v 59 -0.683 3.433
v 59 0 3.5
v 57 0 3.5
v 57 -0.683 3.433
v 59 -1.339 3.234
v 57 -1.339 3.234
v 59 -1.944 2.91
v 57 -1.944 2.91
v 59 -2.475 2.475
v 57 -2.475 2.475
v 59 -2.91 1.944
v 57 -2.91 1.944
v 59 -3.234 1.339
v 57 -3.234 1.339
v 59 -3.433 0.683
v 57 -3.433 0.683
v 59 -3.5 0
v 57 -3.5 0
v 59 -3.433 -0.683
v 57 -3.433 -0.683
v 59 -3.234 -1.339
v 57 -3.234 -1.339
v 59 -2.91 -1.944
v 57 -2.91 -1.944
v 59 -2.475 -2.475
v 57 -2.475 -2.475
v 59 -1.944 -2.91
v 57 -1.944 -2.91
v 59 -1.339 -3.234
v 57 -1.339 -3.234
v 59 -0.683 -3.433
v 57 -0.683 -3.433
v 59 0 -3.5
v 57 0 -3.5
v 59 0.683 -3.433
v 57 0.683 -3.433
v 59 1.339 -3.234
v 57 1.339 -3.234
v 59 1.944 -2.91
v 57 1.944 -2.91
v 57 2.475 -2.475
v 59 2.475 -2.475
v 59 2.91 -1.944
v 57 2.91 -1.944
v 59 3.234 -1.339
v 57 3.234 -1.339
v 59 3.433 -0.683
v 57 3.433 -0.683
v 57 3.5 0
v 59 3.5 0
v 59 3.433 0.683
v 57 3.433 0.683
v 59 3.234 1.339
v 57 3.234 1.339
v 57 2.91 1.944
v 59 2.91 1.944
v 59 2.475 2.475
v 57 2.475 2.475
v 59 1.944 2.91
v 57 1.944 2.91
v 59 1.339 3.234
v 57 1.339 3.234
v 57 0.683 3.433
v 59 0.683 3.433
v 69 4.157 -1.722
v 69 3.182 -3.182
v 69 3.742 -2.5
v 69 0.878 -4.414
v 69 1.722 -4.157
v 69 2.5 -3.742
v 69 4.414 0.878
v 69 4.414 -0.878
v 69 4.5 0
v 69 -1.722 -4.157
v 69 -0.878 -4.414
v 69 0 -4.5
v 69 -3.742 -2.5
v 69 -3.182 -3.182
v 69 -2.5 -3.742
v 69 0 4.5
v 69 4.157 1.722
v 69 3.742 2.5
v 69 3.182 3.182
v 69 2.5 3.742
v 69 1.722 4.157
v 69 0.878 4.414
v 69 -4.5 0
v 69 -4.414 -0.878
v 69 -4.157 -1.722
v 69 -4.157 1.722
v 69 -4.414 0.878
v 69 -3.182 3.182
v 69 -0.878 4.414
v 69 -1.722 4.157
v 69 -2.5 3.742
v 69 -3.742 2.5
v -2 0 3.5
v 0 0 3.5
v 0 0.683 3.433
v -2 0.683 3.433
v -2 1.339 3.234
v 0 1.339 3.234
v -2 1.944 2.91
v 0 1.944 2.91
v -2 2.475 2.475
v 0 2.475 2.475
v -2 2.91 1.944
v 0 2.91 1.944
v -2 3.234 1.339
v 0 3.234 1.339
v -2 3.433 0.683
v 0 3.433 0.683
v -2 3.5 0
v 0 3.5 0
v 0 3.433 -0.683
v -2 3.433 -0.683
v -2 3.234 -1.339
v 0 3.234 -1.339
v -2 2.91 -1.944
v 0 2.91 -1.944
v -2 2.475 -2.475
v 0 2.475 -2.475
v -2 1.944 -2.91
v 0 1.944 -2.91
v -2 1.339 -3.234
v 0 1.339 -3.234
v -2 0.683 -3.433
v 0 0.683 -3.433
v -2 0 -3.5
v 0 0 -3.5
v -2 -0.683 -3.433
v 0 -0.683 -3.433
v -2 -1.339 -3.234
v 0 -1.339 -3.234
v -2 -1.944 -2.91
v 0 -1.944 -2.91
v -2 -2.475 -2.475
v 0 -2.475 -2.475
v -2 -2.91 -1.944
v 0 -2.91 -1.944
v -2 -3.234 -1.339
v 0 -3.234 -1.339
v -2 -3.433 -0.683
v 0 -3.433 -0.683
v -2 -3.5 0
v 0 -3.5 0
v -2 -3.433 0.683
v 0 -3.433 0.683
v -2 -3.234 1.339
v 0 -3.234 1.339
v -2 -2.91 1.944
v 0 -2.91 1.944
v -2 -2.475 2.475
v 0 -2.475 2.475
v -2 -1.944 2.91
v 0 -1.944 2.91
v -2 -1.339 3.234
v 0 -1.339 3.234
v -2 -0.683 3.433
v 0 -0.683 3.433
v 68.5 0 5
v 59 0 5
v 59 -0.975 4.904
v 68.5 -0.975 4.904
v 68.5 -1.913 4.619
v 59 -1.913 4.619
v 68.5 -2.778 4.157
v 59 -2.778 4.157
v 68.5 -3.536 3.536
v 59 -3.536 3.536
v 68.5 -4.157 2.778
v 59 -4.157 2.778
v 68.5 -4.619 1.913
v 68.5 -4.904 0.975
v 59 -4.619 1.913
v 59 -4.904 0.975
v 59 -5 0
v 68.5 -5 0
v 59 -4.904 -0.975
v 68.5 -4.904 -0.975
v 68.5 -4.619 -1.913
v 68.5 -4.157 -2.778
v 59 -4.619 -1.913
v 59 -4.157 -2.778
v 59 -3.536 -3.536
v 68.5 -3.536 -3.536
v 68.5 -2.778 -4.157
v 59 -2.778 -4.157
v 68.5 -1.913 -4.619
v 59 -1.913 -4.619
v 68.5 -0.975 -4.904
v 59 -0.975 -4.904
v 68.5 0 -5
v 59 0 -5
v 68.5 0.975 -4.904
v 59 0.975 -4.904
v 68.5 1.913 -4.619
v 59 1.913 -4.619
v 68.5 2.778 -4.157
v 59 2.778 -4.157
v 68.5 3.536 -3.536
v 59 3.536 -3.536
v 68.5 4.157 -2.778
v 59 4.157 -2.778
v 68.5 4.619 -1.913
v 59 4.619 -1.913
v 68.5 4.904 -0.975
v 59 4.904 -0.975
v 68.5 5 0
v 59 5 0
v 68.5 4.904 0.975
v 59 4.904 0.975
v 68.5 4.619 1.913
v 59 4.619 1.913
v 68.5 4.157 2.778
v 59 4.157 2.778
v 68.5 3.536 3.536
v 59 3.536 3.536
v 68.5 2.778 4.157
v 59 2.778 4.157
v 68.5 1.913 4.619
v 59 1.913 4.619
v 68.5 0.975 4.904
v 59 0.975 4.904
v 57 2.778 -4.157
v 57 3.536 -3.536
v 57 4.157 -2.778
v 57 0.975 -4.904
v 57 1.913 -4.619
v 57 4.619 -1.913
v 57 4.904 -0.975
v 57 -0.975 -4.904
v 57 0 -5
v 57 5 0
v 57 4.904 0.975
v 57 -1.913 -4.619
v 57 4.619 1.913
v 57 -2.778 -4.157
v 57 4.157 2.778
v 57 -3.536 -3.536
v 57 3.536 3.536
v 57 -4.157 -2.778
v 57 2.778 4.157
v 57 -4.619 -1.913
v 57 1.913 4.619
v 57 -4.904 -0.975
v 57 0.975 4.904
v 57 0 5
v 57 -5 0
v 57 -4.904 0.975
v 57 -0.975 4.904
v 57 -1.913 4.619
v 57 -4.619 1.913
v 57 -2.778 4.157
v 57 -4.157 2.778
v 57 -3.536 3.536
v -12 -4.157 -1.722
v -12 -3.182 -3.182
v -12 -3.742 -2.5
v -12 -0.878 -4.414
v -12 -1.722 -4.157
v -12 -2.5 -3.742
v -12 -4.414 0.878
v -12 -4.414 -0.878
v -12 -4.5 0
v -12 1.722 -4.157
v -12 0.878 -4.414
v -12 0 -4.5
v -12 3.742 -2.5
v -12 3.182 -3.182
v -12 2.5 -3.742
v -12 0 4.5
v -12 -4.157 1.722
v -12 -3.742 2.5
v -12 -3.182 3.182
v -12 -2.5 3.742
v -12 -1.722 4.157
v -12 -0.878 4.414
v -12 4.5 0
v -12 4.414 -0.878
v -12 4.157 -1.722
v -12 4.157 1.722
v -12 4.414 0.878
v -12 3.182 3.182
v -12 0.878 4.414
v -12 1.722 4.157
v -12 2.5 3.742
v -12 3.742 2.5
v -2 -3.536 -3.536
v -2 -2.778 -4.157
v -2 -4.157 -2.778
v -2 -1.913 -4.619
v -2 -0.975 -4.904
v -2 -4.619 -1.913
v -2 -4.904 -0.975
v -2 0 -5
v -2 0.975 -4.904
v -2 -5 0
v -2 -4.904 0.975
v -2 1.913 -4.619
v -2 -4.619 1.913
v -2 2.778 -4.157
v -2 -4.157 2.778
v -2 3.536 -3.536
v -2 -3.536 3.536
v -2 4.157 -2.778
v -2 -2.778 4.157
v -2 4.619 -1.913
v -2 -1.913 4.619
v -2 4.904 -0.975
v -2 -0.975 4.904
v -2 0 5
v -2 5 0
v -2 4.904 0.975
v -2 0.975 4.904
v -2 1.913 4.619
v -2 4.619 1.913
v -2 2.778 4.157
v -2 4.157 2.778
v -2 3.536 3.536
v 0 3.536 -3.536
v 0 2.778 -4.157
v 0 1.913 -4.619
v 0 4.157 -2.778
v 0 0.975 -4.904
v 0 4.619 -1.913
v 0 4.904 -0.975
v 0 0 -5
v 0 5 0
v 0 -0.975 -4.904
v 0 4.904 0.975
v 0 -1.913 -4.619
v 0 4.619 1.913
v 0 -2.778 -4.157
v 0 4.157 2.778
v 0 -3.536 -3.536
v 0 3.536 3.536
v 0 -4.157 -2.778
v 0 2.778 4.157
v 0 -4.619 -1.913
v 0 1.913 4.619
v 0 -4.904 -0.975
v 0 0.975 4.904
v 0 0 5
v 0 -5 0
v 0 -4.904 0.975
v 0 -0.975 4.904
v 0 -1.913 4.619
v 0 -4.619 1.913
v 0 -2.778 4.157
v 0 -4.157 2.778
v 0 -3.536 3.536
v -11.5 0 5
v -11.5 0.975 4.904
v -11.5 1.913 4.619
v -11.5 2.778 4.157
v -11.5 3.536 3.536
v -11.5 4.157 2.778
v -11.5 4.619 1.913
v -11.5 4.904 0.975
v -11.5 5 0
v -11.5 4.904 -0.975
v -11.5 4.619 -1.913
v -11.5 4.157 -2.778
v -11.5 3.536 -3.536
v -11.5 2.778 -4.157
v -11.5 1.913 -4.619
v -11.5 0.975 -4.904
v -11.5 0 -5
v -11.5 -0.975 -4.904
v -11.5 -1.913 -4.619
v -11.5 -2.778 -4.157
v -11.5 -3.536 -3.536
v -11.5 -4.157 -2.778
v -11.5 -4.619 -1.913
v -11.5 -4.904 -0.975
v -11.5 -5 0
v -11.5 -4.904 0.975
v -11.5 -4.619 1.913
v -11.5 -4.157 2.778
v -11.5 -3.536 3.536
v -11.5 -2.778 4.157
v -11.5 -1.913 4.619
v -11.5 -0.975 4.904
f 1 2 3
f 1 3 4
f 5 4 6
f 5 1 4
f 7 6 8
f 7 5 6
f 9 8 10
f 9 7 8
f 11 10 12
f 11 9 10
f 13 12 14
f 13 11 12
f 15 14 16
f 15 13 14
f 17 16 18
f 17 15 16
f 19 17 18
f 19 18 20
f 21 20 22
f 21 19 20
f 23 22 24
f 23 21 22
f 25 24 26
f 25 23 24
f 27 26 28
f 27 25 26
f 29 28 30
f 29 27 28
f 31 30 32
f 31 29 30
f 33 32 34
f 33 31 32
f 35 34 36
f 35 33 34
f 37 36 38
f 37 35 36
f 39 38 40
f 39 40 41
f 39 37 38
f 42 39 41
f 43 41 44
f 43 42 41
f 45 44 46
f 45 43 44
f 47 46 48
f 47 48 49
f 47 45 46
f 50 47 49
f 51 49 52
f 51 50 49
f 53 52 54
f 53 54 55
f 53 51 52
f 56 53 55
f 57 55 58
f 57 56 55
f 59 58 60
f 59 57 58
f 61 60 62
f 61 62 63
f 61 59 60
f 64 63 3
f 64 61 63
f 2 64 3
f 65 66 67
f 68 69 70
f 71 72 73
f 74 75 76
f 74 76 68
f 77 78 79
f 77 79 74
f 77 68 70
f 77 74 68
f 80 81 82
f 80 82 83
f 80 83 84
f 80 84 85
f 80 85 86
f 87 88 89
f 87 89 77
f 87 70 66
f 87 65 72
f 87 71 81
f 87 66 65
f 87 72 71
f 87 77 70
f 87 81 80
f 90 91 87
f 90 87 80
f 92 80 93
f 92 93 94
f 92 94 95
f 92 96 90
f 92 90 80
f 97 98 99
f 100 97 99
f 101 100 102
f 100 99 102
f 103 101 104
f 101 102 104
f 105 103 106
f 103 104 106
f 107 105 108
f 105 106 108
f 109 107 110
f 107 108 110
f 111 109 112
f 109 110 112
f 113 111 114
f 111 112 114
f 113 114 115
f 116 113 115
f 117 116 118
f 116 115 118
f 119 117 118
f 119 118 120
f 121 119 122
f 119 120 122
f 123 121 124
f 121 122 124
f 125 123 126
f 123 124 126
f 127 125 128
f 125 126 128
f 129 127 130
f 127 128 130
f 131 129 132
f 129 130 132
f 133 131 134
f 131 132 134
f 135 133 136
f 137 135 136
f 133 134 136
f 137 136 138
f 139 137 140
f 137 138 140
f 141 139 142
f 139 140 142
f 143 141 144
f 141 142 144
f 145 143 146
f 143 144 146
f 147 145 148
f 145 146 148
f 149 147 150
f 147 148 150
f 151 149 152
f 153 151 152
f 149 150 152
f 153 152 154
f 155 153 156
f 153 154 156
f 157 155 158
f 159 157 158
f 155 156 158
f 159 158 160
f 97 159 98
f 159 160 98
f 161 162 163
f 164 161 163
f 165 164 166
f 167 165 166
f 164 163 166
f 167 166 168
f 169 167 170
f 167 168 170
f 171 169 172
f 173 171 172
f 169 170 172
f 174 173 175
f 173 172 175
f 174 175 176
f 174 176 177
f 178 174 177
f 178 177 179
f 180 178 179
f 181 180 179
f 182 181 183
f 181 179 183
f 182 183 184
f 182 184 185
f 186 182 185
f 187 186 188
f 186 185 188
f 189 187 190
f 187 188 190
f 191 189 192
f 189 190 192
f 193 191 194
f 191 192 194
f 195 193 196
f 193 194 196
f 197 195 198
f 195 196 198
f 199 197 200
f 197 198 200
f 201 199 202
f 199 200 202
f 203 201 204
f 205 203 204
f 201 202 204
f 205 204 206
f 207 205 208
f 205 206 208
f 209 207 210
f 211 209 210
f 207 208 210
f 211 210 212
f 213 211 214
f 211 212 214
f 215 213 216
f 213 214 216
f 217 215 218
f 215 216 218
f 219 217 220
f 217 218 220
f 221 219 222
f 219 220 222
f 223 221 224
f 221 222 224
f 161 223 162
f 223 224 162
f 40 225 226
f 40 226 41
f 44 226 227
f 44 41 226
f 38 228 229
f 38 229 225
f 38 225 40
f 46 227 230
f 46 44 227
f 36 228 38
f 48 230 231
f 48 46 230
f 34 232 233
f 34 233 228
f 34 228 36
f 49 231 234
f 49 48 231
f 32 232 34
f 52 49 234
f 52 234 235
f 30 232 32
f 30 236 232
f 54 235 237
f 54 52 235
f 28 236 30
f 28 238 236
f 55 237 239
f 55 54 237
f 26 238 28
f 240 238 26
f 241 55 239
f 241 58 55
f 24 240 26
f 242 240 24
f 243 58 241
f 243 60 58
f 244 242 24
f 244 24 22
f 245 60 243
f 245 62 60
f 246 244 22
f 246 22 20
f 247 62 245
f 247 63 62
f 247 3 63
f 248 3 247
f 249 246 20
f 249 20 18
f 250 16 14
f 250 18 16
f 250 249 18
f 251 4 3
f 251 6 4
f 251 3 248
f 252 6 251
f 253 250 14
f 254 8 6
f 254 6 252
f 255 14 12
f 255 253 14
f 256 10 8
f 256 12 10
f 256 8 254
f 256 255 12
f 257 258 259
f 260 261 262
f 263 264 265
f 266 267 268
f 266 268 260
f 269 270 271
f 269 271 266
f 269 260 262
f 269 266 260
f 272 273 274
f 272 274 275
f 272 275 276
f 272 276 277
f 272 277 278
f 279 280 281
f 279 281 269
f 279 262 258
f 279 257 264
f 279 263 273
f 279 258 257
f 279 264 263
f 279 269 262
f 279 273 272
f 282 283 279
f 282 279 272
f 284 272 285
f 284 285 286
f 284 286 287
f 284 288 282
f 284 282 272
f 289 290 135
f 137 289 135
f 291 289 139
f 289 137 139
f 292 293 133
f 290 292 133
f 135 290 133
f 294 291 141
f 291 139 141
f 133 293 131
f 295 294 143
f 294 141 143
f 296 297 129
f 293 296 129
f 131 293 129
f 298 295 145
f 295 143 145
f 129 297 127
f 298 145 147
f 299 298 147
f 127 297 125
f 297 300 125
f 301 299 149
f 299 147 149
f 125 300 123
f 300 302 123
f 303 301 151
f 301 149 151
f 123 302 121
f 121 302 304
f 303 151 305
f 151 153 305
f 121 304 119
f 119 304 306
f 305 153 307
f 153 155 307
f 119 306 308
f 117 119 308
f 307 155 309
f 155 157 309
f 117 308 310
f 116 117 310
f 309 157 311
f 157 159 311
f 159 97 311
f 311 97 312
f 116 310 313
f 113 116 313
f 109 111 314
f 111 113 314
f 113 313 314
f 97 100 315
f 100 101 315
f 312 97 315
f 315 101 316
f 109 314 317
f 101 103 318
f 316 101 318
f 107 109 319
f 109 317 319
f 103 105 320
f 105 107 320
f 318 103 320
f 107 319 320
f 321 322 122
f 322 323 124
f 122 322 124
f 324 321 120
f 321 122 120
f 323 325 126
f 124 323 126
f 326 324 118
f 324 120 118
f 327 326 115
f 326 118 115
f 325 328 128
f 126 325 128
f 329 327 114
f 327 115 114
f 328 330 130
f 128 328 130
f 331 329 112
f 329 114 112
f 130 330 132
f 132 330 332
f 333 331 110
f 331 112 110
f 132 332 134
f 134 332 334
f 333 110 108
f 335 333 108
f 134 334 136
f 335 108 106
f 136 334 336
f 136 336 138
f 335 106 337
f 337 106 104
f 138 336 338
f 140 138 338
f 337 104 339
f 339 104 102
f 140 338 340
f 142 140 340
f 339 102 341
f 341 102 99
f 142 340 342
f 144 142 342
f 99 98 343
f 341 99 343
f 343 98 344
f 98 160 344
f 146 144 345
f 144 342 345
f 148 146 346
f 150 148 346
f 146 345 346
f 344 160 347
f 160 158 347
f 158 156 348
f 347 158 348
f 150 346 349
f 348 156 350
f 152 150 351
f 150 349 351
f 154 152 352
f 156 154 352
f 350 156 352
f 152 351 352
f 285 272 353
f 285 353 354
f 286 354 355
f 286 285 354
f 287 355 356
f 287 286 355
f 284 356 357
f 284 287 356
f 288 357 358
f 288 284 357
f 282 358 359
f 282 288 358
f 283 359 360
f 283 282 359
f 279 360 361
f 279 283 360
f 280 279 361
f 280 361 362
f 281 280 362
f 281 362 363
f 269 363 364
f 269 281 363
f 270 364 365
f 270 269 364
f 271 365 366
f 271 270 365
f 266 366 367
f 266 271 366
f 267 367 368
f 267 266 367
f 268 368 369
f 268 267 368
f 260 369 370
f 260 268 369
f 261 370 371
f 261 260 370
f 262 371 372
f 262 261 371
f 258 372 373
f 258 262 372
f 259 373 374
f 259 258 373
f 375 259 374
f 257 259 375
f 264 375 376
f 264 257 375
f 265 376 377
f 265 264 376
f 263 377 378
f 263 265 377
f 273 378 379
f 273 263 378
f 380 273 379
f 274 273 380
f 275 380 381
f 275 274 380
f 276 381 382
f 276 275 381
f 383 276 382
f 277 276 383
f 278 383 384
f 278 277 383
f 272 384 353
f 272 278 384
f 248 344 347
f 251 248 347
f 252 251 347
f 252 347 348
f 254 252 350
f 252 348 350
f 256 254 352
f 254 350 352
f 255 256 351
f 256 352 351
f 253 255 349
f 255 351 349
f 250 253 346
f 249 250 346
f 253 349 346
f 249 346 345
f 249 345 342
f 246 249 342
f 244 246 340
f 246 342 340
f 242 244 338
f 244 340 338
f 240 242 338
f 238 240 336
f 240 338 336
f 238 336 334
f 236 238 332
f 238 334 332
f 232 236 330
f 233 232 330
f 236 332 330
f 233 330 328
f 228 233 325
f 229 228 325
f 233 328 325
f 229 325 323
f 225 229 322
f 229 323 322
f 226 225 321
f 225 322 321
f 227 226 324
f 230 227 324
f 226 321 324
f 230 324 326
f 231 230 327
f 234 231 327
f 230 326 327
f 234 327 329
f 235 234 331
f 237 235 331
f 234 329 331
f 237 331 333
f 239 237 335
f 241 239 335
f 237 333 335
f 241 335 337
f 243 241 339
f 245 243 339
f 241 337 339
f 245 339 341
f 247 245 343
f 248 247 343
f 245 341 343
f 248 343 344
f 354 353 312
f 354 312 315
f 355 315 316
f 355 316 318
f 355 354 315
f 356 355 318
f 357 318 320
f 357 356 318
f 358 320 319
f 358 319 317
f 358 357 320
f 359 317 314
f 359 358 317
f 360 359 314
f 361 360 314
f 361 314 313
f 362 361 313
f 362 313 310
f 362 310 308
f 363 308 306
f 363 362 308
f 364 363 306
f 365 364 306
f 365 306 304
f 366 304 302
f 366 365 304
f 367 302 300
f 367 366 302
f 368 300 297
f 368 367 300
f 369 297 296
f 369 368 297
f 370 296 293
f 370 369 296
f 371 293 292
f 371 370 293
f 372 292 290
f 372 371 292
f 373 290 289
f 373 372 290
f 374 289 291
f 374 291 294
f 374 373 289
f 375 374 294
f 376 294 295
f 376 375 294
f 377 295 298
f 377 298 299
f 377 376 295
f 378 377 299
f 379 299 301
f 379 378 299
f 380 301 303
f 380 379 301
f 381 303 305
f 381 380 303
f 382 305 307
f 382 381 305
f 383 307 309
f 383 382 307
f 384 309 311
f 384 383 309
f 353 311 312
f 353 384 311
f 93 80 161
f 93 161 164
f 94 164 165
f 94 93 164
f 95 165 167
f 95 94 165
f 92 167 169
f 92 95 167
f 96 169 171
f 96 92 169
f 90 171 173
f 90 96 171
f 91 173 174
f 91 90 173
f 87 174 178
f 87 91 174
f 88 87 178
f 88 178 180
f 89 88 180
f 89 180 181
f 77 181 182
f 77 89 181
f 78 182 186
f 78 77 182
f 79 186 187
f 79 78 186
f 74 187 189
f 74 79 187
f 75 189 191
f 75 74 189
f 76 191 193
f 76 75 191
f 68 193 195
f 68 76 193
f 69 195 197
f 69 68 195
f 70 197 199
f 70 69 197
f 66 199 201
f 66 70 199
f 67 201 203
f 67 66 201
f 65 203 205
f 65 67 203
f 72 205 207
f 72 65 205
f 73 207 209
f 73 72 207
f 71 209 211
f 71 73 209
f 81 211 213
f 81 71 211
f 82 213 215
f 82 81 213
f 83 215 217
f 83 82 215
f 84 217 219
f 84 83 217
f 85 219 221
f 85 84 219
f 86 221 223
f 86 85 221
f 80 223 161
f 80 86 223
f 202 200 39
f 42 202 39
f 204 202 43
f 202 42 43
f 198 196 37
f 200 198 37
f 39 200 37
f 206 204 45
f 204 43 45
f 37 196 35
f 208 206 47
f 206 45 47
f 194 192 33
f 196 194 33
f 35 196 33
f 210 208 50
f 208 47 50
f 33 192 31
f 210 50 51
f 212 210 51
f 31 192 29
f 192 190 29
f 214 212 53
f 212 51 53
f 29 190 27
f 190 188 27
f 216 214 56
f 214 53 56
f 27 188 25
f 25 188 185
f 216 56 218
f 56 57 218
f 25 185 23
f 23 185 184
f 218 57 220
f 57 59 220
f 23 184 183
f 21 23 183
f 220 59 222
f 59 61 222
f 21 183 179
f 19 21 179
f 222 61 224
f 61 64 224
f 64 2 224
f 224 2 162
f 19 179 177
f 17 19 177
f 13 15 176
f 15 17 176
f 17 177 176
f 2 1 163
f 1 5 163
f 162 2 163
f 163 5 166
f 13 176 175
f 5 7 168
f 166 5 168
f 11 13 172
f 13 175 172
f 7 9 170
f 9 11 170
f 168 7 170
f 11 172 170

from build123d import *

# Parameters (mm, degrees)
SKETCH_4_R      = 5
EXTRUDE_4_DEPTH = 57
SKETCH_5_R      = 3.5
EXTRUDE_5_DEPTH = 2
EXTRUDE_START   = 10
SKETCH_6_R      = 5
EXTRUDE_6_DEPTH = 10
EXTRUDE_START_2 = 2
SKETCH_7_R      = 3.5
EXTRUDE_7_DEPTH = 2
SKETCH_8_R      = 5
EXTRUDE_8_DEPTH = 10
CHAMFER_1_SIZE  = 0.5


with BuildPart() as part:
    # 草图4 → 凸台-拉伸4 (new body)
    with BuildSketch(Plane(origin=(0, 0, 0), x_dir=(0, 0, -1), z_dir=(1, 0, 0))):
        with Locations(Location((0, 0, 0), (0, 0, 180))):
            Circle(SKETCH_4_R)
    extrude(amount=EXTRUDE_4_DEPTH)

    # 草图5 → 凸台-拉伸5 (add)
    with BuildSketch(Plane.ZY):
        Circle(SKETCH_5_R)
    extrude(amount=EXTRUDE_5_DEPTH)

    # 草图6 → 凸台-拉伸6 (add)
    with BuildSketch(Plane.ZY.offset(2).offset(EXTRUDE_START)):
        Circle(SKETCH_6_R)
    extrude(amount=-EXTRUDE_6_DEPTH)

    # 草图7 → 凸台-拉伸7 (add)
    with BuildSketch(Plane(origin=(57, 0, 0), x_dir=(0, 0, -1), z_dir=(1, 0, 0)).offset(EXTRUDE_START_2)):
        with Locations(Location((0, 0, 0), (0, 0, 180))):
            Circle(SKETCH_7_R)
    extrude(amount=-EXTRUDE_7_DEPTH)

    # 草图8 → 凸台-拉伸8 (add)
    with BuildSketch(Plane(origin=(59, 0, 0), x_dir=(0, 0, -1), z_dir=(1, 0, 0))):
        with Locations(Location((0, 0, 0), (0, 0, 180))):
            Circle(SKETCH_8_R)
    extrude(amount=EXTRUDE_8_DEPTH)

    # 倒角1
    chamfer_1_edges = [part.edges().sort_by_distance(p)[0] for p in [
        (-12, 0, -5),
        (69, 0, -5),
    ]]
    chamfer(chamfer_1_edges, length=CHAMFER_1_SIZE)


solid = part.part
